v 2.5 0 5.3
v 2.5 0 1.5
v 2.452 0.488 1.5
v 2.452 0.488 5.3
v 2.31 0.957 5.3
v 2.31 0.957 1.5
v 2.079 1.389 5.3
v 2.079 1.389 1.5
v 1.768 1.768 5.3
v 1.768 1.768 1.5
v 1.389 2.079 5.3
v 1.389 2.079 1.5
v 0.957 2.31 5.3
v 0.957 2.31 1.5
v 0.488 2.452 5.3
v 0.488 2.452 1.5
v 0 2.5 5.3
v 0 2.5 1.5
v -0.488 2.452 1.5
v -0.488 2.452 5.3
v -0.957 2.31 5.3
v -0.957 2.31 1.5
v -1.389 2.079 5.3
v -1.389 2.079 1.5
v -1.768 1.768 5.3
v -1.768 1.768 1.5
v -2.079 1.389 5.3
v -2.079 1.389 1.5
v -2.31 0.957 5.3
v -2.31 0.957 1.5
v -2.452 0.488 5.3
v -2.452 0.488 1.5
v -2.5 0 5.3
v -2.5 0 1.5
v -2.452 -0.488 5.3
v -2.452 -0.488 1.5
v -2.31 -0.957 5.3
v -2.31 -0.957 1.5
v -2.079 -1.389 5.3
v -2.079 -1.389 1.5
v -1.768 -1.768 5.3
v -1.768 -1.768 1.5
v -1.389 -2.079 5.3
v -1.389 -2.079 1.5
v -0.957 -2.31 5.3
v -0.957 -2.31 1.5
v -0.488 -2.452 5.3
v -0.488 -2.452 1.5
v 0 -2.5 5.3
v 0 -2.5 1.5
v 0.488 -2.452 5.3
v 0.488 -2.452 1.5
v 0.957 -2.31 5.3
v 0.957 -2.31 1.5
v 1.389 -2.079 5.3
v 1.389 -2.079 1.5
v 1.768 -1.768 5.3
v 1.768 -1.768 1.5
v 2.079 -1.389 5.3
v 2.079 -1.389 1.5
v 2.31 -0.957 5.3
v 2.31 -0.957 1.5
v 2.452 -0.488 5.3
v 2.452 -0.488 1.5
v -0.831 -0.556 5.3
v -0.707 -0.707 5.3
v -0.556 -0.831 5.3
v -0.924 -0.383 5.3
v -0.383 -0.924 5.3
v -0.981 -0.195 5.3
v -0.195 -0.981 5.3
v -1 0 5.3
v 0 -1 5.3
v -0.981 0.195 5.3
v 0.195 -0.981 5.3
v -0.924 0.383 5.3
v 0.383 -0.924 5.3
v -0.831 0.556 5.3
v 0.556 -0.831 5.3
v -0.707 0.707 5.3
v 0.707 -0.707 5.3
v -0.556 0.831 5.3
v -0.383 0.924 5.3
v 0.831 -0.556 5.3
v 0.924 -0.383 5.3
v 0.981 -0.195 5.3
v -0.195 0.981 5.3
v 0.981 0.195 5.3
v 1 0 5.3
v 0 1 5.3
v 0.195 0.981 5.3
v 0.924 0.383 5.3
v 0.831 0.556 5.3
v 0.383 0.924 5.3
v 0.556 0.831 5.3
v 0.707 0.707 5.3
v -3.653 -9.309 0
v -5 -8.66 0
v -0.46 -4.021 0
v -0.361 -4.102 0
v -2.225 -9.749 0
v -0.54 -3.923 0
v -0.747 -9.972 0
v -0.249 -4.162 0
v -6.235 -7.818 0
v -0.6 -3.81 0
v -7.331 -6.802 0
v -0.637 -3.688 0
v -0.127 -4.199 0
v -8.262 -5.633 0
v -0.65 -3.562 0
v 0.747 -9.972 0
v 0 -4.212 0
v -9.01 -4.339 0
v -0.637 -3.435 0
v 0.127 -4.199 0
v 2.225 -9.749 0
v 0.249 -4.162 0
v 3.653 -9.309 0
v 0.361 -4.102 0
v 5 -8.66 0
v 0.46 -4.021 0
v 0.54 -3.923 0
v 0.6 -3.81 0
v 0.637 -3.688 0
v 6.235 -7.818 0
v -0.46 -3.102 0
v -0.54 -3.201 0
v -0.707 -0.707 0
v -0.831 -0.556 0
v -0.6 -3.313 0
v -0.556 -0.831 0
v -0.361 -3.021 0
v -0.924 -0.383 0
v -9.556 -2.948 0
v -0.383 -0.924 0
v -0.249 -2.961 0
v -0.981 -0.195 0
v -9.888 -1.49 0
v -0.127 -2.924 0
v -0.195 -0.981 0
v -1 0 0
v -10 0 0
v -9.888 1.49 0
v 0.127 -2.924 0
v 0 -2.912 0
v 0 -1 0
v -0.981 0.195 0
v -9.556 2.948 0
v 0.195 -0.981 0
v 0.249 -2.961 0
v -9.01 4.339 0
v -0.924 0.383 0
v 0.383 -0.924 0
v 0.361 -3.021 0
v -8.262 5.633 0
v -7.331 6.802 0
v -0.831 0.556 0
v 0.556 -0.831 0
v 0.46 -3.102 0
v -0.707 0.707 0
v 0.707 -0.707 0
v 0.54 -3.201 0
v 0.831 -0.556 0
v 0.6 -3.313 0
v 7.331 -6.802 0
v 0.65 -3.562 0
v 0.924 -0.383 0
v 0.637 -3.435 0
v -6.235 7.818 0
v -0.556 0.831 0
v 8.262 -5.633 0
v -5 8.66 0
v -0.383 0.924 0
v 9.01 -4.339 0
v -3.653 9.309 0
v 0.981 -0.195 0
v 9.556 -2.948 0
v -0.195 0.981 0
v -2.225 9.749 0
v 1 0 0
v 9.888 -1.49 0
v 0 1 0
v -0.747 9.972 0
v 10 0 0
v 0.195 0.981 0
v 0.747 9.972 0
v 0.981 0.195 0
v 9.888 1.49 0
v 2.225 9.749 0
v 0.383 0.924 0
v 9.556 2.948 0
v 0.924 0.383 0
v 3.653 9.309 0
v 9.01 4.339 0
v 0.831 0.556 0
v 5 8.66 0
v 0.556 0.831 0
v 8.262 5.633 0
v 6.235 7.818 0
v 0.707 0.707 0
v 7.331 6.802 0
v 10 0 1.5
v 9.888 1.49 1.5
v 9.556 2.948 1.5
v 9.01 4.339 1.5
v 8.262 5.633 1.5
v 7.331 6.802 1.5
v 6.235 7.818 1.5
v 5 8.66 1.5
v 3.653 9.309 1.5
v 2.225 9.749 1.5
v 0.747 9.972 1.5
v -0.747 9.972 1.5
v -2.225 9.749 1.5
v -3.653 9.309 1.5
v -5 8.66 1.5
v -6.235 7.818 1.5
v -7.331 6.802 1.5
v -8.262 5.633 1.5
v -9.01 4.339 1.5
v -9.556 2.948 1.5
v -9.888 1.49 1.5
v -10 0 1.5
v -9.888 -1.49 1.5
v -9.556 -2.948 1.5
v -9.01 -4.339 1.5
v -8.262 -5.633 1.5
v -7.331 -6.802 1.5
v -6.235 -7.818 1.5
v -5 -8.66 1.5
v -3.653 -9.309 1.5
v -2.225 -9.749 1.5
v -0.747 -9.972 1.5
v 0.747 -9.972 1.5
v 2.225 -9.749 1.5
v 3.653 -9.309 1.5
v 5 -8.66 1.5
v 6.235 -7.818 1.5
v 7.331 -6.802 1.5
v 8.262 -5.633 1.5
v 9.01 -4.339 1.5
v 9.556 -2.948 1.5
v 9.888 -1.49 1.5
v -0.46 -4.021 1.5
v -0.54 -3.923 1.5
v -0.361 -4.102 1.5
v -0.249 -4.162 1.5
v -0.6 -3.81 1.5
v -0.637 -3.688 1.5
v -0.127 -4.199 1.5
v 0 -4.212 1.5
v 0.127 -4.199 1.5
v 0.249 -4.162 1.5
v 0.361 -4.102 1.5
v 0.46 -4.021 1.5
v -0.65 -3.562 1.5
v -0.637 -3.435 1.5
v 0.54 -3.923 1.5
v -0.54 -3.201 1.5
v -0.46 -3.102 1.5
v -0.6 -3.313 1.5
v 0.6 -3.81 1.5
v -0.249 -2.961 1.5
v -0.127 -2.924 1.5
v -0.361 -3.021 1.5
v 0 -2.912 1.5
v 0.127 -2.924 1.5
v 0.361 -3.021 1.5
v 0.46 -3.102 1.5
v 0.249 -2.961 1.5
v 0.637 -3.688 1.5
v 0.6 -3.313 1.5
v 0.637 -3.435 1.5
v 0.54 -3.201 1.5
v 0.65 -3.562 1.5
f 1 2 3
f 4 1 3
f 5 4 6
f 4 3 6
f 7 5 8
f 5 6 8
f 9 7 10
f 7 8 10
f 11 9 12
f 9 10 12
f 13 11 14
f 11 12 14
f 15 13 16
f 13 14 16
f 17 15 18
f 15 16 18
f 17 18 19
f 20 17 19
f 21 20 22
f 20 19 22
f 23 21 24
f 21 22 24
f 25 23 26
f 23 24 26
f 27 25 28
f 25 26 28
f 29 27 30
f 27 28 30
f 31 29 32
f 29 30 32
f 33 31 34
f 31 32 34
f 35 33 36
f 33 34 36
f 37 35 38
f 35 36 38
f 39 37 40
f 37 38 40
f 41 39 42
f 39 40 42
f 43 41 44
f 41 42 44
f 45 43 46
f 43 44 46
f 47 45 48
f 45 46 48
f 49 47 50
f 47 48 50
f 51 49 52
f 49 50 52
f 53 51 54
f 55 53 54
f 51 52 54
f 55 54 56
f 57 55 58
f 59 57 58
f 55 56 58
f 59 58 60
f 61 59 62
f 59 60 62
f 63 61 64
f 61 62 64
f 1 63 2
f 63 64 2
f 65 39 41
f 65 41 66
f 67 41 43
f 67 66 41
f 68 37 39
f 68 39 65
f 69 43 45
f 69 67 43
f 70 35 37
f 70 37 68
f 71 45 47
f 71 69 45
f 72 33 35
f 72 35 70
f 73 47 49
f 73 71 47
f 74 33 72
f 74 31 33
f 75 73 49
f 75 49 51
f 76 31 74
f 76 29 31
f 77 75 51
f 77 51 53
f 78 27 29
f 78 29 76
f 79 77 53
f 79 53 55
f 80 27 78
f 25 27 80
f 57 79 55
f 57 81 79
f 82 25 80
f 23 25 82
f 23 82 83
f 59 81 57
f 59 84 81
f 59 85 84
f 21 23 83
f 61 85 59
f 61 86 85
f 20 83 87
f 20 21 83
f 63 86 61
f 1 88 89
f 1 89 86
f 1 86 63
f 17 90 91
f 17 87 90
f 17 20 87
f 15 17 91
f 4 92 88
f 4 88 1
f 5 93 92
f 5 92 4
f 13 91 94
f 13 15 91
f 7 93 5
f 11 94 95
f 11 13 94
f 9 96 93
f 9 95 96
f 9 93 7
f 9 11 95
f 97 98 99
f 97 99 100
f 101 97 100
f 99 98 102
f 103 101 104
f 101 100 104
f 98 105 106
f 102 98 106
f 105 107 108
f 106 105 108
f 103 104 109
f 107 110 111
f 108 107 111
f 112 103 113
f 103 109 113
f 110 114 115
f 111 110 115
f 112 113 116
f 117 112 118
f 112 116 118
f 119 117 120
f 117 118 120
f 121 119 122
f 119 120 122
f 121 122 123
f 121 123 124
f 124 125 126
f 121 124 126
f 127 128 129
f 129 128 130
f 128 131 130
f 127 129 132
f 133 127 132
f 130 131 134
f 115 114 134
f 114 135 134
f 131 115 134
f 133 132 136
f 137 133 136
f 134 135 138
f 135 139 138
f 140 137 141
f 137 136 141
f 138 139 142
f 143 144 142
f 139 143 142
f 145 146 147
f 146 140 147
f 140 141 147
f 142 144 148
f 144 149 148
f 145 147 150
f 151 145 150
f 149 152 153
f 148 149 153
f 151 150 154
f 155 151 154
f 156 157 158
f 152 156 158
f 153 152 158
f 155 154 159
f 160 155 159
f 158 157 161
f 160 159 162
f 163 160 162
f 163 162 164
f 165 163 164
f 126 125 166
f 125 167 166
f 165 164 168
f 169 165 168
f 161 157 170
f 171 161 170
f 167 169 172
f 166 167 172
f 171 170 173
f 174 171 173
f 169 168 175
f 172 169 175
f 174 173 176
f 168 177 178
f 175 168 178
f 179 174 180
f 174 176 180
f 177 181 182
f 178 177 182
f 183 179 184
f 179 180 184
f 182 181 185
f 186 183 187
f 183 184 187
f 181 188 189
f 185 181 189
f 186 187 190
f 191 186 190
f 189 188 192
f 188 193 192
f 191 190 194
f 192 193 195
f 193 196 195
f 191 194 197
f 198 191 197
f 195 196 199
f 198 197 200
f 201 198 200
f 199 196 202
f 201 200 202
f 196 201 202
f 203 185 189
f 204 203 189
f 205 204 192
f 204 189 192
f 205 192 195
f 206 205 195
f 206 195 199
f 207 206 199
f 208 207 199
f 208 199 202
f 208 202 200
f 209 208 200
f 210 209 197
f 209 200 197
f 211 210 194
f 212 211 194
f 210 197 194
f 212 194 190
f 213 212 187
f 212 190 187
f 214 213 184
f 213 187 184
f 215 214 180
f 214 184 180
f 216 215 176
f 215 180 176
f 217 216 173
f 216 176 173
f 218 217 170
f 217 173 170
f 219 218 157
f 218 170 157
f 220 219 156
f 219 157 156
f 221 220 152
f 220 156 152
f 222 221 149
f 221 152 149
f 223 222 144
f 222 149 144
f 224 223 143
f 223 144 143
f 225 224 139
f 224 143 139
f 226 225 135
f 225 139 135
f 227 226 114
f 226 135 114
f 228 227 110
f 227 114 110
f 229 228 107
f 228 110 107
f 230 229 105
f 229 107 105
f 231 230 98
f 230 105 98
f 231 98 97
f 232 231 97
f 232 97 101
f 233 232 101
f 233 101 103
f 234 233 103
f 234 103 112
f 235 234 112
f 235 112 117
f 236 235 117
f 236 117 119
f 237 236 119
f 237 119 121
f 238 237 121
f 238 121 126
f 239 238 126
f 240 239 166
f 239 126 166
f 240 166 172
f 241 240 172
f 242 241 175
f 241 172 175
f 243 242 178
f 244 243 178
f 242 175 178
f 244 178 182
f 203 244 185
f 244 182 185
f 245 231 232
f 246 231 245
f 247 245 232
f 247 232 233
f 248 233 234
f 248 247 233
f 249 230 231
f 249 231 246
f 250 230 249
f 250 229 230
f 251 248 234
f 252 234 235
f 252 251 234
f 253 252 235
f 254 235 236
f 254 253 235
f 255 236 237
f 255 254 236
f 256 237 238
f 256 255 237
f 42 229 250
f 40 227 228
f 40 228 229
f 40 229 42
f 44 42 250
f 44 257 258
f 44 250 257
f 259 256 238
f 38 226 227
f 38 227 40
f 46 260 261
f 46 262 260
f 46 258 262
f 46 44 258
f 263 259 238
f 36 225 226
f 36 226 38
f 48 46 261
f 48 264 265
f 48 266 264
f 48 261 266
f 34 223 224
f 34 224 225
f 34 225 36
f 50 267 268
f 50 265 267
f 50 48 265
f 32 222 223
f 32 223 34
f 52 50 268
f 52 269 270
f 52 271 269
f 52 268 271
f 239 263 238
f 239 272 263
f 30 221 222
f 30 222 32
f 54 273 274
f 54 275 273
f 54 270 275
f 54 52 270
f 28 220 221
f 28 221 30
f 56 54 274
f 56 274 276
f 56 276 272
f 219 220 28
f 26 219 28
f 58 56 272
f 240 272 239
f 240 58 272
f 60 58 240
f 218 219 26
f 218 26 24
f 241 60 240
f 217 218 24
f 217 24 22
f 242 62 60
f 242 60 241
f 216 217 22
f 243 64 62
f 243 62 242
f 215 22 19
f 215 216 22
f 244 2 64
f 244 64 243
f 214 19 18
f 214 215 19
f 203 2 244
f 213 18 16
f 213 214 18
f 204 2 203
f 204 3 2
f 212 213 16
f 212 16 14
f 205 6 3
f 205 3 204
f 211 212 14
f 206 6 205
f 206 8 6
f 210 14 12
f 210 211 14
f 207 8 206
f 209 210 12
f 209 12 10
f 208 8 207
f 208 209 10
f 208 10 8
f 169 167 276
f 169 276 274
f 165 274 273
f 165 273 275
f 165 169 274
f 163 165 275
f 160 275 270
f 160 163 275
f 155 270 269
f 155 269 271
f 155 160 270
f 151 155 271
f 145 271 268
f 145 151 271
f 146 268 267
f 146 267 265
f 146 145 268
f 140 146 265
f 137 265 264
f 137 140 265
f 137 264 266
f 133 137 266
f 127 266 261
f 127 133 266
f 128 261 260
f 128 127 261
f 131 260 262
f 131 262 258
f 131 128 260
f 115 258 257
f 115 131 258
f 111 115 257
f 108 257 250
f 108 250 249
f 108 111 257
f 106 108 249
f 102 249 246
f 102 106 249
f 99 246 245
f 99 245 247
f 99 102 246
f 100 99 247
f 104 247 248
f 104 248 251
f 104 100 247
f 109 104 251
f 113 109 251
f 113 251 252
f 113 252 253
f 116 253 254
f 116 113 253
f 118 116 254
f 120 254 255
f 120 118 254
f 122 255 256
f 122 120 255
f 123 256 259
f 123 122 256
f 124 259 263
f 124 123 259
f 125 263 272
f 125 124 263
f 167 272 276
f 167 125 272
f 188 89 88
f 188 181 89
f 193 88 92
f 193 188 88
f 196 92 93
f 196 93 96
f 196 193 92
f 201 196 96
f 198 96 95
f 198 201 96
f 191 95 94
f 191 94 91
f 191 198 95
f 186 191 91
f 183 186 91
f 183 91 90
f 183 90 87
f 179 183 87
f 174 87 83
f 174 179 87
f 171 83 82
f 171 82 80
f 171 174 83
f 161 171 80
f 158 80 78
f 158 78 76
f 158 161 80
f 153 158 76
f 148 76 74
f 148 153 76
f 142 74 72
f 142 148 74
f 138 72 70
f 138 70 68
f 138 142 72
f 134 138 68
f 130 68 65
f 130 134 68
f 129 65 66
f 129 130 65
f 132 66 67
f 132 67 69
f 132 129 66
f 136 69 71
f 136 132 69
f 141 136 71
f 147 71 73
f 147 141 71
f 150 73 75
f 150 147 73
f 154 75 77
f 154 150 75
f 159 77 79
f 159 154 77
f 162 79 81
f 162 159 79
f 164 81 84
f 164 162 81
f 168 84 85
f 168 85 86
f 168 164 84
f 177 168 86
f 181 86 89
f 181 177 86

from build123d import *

# Parameters (mm, degrees)
F0_R     = 10
F0_R_2   = 1
F1_DEPTH = 1.5
F2_R     = 2.5
F2_R_2   = 1
F3_DEPTH = 3.8
F4_R     = 0.6498381819
F5_DEPTH = 1.5


# Not quite as in the source:
# - a feature names something its author has since deleted; it is built from what else it names


with BuildPart() as f1:
    # F0 (on Top) → F1 (new body)
    with BuildSketch(Plane.XY):
        Circle(F0_R)
        Circle(F0_R_2, mode=Mode.SUBTRACT)
    extrude(amount=F1_DEPTH)

    # F2 (on face) → F3 (join)
    with BuildSketch(Plane.XY.offset(1.5)):
        Circle(F2_R)
        Circle(F2_R_2, mode=Mode.SUBTRACT)
    extrude(amount=F3_DEPTH)

    # F4 (on Top) → F5 (cut, through all)
    with BuildSketch(Plane.XY):
        with Locations((0, -3.5616646055)):
            Circle(F4_R)
    extrude(amount=F5_DEPTH, mode=Mode.SUBTRACT)


solid = f1.part
